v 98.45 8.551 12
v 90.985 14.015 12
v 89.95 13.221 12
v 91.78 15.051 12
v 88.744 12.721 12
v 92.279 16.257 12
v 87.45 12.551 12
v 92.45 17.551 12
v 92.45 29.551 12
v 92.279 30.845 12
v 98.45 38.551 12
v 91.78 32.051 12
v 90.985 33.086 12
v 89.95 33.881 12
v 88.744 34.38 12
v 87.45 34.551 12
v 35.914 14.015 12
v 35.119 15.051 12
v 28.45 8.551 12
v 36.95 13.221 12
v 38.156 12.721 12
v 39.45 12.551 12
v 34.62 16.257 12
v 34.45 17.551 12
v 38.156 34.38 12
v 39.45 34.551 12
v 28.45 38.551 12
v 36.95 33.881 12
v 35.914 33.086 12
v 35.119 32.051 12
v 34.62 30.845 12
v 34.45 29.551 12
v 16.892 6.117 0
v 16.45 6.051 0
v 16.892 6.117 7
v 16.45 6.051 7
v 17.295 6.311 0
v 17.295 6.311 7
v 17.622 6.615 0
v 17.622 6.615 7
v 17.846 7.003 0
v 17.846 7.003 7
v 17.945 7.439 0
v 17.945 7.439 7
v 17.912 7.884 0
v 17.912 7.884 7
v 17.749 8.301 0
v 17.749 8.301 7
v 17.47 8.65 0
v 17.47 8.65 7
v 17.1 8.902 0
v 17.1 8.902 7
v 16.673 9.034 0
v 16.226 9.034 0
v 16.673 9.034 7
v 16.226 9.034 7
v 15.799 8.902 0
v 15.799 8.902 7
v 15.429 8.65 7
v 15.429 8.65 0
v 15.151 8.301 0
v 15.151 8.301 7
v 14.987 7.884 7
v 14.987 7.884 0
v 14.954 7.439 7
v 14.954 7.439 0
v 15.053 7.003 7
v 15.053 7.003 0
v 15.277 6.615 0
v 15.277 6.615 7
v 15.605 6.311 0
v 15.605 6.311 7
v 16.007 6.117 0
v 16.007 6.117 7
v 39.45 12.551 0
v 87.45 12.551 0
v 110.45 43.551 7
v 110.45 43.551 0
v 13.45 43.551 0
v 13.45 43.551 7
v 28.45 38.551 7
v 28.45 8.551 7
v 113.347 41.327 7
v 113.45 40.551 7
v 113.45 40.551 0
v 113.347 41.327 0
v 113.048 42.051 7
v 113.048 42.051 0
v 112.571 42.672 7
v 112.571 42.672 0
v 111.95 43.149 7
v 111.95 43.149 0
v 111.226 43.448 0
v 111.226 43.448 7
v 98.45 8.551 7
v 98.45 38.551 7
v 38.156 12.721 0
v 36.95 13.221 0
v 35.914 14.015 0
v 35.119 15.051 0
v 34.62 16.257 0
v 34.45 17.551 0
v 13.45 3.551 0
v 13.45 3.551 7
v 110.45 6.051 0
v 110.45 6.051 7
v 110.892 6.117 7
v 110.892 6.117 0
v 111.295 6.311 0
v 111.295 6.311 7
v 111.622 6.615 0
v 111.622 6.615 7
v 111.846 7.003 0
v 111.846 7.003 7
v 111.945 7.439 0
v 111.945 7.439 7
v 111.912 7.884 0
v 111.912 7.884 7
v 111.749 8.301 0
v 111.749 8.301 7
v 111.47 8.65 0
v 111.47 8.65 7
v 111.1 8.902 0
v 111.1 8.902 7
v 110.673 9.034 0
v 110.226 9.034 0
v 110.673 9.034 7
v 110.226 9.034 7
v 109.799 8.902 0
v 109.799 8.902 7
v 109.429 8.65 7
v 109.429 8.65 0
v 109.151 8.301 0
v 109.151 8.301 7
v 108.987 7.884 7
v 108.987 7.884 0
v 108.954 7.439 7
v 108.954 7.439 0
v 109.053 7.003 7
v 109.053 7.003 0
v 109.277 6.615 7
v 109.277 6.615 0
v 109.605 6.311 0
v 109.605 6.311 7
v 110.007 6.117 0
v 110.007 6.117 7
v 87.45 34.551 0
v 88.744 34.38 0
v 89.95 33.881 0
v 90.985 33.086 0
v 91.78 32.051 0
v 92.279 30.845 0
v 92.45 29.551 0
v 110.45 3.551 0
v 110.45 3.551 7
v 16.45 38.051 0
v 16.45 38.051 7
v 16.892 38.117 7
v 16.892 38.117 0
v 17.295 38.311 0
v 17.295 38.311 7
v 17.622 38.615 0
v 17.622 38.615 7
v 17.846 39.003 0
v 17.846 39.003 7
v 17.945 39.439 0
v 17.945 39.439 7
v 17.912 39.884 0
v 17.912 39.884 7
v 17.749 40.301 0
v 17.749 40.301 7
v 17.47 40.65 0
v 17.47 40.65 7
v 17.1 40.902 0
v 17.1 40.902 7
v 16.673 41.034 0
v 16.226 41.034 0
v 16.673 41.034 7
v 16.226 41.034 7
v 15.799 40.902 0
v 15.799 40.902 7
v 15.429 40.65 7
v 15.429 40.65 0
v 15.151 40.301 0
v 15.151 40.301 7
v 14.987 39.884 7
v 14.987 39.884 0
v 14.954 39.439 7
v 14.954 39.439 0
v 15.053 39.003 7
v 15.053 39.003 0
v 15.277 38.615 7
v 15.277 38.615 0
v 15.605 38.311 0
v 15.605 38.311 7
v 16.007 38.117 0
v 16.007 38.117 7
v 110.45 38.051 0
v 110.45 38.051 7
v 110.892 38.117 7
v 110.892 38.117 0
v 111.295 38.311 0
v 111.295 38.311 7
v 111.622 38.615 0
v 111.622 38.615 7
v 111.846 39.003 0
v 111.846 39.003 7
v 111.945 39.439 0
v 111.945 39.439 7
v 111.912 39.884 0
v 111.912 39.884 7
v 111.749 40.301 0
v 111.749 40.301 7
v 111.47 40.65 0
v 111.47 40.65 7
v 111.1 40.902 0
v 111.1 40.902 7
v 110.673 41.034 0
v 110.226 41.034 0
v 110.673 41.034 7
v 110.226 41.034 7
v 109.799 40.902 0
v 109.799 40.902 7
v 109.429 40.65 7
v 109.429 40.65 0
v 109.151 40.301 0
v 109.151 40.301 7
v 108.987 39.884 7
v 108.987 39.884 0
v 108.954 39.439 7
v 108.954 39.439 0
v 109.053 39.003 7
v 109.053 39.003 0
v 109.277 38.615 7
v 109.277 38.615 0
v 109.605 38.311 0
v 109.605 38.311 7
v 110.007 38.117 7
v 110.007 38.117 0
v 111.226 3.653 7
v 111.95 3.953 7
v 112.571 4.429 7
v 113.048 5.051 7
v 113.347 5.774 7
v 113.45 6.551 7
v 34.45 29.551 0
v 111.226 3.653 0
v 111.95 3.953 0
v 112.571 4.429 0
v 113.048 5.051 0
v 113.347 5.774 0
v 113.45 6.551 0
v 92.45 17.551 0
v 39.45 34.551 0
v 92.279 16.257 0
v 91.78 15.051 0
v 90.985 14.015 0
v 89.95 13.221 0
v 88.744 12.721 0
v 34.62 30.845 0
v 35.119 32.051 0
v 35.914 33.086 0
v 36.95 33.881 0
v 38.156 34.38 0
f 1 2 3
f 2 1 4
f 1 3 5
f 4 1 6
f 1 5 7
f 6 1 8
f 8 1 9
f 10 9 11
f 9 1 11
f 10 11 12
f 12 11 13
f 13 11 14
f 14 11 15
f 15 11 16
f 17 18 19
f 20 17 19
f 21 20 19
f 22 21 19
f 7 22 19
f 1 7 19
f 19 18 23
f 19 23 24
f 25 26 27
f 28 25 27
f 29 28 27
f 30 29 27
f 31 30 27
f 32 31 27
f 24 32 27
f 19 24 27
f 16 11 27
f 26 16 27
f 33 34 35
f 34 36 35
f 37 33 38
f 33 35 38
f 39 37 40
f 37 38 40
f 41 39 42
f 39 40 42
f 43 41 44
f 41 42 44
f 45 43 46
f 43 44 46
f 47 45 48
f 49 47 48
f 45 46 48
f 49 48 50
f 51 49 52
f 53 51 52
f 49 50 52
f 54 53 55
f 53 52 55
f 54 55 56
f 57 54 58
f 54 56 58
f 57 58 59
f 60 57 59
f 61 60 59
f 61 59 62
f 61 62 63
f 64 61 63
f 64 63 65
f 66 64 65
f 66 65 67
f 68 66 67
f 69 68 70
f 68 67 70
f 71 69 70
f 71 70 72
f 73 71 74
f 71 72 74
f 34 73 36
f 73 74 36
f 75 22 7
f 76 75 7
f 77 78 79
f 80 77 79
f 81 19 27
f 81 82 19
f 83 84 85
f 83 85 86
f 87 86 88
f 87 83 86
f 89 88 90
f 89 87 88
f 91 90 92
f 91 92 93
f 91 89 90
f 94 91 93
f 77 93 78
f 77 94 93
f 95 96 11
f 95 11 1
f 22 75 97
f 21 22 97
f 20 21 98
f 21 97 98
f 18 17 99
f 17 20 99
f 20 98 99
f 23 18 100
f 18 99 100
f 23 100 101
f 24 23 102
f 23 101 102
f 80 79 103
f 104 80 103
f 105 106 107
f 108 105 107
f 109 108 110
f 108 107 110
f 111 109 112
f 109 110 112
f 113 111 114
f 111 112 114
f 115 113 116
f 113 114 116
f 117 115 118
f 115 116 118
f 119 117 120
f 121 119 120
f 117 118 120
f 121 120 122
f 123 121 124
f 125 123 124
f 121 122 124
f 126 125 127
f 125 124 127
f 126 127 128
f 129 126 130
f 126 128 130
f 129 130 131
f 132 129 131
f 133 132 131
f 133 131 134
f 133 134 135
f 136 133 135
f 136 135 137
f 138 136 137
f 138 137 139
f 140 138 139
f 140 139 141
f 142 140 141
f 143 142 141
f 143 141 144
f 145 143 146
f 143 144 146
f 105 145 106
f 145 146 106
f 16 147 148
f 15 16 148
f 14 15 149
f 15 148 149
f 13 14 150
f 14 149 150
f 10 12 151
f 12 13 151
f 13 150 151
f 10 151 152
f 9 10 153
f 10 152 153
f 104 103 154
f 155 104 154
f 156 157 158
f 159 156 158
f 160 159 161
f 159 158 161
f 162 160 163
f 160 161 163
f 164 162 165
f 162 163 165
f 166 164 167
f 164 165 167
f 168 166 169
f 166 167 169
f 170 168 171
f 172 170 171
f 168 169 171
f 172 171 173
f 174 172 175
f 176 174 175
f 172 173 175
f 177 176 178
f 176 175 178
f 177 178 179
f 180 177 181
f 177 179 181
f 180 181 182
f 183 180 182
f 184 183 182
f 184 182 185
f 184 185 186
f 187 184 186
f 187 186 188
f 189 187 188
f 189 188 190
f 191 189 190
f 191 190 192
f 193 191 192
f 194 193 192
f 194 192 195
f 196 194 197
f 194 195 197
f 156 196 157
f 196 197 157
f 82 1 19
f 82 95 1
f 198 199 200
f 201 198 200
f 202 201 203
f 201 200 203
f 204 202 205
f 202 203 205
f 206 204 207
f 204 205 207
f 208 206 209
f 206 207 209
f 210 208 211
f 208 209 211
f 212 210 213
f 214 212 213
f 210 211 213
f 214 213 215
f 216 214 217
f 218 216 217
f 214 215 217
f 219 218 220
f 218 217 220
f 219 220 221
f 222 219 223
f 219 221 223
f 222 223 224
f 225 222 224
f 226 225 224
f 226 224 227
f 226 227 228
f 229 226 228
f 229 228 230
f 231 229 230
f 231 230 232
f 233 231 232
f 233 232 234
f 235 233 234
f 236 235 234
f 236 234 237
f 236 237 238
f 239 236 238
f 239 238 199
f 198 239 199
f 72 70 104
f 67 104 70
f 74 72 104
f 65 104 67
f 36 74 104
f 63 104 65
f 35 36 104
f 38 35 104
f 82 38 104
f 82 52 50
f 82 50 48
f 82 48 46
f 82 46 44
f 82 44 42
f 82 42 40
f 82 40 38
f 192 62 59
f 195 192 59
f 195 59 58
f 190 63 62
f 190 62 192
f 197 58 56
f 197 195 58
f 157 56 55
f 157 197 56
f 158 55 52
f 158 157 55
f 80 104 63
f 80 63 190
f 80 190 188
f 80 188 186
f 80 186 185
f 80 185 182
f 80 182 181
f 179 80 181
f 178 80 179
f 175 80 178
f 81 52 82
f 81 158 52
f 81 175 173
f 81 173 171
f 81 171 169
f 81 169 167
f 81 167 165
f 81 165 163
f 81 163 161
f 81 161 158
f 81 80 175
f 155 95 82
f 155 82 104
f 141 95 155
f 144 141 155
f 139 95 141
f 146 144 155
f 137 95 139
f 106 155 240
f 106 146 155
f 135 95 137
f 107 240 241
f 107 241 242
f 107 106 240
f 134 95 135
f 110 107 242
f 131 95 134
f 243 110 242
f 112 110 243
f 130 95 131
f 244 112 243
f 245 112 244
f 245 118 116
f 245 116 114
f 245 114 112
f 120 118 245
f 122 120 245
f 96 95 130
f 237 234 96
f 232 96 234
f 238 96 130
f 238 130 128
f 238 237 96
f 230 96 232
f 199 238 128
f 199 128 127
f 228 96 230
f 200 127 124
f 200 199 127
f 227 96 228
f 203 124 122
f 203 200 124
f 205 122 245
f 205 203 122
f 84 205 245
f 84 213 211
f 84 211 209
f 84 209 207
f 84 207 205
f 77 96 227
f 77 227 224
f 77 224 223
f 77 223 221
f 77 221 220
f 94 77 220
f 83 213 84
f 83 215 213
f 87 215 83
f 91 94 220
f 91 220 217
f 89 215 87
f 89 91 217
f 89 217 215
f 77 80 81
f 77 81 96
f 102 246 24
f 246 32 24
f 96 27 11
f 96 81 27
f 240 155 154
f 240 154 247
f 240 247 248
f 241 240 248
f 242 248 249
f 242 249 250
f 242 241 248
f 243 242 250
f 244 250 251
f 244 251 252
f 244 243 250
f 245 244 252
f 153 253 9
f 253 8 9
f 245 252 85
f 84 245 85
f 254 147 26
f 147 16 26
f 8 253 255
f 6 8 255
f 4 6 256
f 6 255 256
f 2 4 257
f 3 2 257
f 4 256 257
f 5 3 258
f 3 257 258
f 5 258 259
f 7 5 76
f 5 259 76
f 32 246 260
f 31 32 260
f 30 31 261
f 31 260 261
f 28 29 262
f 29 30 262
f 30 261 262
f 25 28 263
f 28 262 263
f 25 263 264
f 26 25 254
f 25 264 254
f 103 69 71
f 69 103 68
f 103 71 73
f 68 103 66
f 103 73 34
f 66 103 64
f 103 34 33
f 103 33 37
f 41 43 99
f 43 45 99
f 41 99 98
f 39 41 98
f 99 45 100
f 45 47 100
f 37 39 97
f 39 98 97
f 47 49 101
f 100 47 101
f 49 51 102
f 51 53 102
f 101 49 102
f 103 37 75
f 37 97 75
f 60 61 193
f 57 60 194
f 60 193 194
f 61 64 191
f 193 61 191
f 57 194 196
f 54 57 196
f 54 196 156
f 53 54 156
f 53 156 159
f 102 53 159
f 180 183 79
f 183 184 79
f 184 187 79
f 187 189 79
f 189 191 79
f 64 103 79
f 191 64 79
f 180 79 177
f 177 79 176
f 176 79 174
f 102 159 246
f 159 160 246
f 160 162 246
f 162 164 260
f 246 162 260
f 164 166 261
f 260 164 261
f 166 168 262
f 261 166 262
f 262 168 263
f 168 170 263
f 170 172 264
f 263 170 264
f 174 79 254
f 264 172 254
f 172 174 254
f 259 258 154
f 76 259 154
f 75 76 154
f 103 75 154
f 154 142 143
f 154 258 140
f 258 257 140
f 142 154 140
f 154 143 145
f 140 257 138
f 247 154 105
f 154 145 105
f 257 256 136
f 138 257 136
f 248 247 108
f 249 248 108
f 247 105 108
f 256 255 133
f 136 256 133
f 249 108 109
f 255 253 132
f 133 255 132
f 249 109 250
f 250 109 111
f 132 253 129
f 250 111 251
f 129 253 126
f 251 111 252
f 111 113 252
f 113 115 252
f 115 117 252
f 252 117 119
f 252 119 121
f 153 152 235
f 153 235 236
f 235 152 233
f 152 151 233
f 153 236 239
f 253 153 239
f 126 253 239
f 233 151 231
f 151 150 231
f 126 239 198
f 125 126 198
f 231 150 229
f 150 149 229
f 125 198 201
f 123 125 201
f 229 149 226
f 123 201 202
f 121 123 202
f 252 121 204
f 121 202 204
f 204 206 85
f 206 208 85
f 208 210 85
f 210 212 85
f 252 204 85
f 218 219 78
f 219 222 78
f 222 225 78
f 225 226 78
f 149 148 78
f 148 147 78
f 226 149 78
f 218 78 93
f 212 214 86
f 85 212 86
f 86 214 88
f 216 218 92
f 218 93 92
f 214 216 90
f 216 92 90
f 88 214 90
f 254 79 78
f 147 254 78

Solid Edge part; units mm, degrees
sketch "Sketch1" plane through (0, 0, 0) normal (0, 0, 1) x (1, 0, 0)
  line L0 (13.4496, 3.5507) -> (113.4496, 3.5507)
  line L1 (113.4496, 3.5507) -> (113.4496, 43.5507)
  line L2 (113.4496, 43.5507) -> (13.4496, 43.5507)
  line L3 (13.4496, 43.5507) -> (13.4496, 3.5507)
extrude "Protrusion1" add sketch "Sketch1" along normal blind 7
hole "Hole_1" at (16.4496, 39.5507, 7) direction (0, 0, -1) diameter 3 end through all
hole "Hole1" at (16.4496, 7.5507, 7) direction (0, 0, -1) diameter 3 end through all
hole "Hole2" at (110.4496, 7.5507, 7) direction (0, 0, -1) diameter 3 end through all
hole "Hole3" at (110.4496, 39.5507, 7) direction (0, 0, -1) diameter 3 end through all
sketch "Sketch2" plane through (63.4496, 23.5507, 7) normal (0, 0, 1) x (1, 0, 0)
  line L0 (-35, 15) -> (35, 15)
  line L1 (35, 15) -> (35, -15)
  line L2 (35, -15) -> (-35, -15)
  line L3 (-35, -15) -> (-35, 15)
  dimension "D1" = 15
  dimension "D2" = 5
  dimension "D3" = 5
  dimension "D4" = 15
extrude "ExtrudedProtrusion_2" add sketch "Sketch2" along normal blind 5
sketch "Sketch3" plane through (63.4496, 23.5507, 12) normal (0, 0, 1) x (0, 1, 0)
  line L0 (-11, -29) -> (11, -29)
  line L1 (11, -29) -> (11, 29)
  line L2 (11, 29) -> (-11, 29)
  line L3 (-11, 29) -> (-11, -29)
  dimension "D1" = 4
  dimension "D2" = 4
  dimension "D3" = 4
  dimension "D4" = 6
  dimension "D5" = 6
extrude "Cutout1" cut sketch "Sketch3" against normal through all
fillet "Round_2" radius 5 4 edges at (34.4496, 34.5507, 6) (34.4496, 12.5507, 6) (92.4496, 12.5507, 6) (92.4496, 34.5507, 6)
fillet "Round_4" radius 3 2 edges at (113.4496, 43.5507, 3.5) (113.4496, 3.5507, 3.5)
